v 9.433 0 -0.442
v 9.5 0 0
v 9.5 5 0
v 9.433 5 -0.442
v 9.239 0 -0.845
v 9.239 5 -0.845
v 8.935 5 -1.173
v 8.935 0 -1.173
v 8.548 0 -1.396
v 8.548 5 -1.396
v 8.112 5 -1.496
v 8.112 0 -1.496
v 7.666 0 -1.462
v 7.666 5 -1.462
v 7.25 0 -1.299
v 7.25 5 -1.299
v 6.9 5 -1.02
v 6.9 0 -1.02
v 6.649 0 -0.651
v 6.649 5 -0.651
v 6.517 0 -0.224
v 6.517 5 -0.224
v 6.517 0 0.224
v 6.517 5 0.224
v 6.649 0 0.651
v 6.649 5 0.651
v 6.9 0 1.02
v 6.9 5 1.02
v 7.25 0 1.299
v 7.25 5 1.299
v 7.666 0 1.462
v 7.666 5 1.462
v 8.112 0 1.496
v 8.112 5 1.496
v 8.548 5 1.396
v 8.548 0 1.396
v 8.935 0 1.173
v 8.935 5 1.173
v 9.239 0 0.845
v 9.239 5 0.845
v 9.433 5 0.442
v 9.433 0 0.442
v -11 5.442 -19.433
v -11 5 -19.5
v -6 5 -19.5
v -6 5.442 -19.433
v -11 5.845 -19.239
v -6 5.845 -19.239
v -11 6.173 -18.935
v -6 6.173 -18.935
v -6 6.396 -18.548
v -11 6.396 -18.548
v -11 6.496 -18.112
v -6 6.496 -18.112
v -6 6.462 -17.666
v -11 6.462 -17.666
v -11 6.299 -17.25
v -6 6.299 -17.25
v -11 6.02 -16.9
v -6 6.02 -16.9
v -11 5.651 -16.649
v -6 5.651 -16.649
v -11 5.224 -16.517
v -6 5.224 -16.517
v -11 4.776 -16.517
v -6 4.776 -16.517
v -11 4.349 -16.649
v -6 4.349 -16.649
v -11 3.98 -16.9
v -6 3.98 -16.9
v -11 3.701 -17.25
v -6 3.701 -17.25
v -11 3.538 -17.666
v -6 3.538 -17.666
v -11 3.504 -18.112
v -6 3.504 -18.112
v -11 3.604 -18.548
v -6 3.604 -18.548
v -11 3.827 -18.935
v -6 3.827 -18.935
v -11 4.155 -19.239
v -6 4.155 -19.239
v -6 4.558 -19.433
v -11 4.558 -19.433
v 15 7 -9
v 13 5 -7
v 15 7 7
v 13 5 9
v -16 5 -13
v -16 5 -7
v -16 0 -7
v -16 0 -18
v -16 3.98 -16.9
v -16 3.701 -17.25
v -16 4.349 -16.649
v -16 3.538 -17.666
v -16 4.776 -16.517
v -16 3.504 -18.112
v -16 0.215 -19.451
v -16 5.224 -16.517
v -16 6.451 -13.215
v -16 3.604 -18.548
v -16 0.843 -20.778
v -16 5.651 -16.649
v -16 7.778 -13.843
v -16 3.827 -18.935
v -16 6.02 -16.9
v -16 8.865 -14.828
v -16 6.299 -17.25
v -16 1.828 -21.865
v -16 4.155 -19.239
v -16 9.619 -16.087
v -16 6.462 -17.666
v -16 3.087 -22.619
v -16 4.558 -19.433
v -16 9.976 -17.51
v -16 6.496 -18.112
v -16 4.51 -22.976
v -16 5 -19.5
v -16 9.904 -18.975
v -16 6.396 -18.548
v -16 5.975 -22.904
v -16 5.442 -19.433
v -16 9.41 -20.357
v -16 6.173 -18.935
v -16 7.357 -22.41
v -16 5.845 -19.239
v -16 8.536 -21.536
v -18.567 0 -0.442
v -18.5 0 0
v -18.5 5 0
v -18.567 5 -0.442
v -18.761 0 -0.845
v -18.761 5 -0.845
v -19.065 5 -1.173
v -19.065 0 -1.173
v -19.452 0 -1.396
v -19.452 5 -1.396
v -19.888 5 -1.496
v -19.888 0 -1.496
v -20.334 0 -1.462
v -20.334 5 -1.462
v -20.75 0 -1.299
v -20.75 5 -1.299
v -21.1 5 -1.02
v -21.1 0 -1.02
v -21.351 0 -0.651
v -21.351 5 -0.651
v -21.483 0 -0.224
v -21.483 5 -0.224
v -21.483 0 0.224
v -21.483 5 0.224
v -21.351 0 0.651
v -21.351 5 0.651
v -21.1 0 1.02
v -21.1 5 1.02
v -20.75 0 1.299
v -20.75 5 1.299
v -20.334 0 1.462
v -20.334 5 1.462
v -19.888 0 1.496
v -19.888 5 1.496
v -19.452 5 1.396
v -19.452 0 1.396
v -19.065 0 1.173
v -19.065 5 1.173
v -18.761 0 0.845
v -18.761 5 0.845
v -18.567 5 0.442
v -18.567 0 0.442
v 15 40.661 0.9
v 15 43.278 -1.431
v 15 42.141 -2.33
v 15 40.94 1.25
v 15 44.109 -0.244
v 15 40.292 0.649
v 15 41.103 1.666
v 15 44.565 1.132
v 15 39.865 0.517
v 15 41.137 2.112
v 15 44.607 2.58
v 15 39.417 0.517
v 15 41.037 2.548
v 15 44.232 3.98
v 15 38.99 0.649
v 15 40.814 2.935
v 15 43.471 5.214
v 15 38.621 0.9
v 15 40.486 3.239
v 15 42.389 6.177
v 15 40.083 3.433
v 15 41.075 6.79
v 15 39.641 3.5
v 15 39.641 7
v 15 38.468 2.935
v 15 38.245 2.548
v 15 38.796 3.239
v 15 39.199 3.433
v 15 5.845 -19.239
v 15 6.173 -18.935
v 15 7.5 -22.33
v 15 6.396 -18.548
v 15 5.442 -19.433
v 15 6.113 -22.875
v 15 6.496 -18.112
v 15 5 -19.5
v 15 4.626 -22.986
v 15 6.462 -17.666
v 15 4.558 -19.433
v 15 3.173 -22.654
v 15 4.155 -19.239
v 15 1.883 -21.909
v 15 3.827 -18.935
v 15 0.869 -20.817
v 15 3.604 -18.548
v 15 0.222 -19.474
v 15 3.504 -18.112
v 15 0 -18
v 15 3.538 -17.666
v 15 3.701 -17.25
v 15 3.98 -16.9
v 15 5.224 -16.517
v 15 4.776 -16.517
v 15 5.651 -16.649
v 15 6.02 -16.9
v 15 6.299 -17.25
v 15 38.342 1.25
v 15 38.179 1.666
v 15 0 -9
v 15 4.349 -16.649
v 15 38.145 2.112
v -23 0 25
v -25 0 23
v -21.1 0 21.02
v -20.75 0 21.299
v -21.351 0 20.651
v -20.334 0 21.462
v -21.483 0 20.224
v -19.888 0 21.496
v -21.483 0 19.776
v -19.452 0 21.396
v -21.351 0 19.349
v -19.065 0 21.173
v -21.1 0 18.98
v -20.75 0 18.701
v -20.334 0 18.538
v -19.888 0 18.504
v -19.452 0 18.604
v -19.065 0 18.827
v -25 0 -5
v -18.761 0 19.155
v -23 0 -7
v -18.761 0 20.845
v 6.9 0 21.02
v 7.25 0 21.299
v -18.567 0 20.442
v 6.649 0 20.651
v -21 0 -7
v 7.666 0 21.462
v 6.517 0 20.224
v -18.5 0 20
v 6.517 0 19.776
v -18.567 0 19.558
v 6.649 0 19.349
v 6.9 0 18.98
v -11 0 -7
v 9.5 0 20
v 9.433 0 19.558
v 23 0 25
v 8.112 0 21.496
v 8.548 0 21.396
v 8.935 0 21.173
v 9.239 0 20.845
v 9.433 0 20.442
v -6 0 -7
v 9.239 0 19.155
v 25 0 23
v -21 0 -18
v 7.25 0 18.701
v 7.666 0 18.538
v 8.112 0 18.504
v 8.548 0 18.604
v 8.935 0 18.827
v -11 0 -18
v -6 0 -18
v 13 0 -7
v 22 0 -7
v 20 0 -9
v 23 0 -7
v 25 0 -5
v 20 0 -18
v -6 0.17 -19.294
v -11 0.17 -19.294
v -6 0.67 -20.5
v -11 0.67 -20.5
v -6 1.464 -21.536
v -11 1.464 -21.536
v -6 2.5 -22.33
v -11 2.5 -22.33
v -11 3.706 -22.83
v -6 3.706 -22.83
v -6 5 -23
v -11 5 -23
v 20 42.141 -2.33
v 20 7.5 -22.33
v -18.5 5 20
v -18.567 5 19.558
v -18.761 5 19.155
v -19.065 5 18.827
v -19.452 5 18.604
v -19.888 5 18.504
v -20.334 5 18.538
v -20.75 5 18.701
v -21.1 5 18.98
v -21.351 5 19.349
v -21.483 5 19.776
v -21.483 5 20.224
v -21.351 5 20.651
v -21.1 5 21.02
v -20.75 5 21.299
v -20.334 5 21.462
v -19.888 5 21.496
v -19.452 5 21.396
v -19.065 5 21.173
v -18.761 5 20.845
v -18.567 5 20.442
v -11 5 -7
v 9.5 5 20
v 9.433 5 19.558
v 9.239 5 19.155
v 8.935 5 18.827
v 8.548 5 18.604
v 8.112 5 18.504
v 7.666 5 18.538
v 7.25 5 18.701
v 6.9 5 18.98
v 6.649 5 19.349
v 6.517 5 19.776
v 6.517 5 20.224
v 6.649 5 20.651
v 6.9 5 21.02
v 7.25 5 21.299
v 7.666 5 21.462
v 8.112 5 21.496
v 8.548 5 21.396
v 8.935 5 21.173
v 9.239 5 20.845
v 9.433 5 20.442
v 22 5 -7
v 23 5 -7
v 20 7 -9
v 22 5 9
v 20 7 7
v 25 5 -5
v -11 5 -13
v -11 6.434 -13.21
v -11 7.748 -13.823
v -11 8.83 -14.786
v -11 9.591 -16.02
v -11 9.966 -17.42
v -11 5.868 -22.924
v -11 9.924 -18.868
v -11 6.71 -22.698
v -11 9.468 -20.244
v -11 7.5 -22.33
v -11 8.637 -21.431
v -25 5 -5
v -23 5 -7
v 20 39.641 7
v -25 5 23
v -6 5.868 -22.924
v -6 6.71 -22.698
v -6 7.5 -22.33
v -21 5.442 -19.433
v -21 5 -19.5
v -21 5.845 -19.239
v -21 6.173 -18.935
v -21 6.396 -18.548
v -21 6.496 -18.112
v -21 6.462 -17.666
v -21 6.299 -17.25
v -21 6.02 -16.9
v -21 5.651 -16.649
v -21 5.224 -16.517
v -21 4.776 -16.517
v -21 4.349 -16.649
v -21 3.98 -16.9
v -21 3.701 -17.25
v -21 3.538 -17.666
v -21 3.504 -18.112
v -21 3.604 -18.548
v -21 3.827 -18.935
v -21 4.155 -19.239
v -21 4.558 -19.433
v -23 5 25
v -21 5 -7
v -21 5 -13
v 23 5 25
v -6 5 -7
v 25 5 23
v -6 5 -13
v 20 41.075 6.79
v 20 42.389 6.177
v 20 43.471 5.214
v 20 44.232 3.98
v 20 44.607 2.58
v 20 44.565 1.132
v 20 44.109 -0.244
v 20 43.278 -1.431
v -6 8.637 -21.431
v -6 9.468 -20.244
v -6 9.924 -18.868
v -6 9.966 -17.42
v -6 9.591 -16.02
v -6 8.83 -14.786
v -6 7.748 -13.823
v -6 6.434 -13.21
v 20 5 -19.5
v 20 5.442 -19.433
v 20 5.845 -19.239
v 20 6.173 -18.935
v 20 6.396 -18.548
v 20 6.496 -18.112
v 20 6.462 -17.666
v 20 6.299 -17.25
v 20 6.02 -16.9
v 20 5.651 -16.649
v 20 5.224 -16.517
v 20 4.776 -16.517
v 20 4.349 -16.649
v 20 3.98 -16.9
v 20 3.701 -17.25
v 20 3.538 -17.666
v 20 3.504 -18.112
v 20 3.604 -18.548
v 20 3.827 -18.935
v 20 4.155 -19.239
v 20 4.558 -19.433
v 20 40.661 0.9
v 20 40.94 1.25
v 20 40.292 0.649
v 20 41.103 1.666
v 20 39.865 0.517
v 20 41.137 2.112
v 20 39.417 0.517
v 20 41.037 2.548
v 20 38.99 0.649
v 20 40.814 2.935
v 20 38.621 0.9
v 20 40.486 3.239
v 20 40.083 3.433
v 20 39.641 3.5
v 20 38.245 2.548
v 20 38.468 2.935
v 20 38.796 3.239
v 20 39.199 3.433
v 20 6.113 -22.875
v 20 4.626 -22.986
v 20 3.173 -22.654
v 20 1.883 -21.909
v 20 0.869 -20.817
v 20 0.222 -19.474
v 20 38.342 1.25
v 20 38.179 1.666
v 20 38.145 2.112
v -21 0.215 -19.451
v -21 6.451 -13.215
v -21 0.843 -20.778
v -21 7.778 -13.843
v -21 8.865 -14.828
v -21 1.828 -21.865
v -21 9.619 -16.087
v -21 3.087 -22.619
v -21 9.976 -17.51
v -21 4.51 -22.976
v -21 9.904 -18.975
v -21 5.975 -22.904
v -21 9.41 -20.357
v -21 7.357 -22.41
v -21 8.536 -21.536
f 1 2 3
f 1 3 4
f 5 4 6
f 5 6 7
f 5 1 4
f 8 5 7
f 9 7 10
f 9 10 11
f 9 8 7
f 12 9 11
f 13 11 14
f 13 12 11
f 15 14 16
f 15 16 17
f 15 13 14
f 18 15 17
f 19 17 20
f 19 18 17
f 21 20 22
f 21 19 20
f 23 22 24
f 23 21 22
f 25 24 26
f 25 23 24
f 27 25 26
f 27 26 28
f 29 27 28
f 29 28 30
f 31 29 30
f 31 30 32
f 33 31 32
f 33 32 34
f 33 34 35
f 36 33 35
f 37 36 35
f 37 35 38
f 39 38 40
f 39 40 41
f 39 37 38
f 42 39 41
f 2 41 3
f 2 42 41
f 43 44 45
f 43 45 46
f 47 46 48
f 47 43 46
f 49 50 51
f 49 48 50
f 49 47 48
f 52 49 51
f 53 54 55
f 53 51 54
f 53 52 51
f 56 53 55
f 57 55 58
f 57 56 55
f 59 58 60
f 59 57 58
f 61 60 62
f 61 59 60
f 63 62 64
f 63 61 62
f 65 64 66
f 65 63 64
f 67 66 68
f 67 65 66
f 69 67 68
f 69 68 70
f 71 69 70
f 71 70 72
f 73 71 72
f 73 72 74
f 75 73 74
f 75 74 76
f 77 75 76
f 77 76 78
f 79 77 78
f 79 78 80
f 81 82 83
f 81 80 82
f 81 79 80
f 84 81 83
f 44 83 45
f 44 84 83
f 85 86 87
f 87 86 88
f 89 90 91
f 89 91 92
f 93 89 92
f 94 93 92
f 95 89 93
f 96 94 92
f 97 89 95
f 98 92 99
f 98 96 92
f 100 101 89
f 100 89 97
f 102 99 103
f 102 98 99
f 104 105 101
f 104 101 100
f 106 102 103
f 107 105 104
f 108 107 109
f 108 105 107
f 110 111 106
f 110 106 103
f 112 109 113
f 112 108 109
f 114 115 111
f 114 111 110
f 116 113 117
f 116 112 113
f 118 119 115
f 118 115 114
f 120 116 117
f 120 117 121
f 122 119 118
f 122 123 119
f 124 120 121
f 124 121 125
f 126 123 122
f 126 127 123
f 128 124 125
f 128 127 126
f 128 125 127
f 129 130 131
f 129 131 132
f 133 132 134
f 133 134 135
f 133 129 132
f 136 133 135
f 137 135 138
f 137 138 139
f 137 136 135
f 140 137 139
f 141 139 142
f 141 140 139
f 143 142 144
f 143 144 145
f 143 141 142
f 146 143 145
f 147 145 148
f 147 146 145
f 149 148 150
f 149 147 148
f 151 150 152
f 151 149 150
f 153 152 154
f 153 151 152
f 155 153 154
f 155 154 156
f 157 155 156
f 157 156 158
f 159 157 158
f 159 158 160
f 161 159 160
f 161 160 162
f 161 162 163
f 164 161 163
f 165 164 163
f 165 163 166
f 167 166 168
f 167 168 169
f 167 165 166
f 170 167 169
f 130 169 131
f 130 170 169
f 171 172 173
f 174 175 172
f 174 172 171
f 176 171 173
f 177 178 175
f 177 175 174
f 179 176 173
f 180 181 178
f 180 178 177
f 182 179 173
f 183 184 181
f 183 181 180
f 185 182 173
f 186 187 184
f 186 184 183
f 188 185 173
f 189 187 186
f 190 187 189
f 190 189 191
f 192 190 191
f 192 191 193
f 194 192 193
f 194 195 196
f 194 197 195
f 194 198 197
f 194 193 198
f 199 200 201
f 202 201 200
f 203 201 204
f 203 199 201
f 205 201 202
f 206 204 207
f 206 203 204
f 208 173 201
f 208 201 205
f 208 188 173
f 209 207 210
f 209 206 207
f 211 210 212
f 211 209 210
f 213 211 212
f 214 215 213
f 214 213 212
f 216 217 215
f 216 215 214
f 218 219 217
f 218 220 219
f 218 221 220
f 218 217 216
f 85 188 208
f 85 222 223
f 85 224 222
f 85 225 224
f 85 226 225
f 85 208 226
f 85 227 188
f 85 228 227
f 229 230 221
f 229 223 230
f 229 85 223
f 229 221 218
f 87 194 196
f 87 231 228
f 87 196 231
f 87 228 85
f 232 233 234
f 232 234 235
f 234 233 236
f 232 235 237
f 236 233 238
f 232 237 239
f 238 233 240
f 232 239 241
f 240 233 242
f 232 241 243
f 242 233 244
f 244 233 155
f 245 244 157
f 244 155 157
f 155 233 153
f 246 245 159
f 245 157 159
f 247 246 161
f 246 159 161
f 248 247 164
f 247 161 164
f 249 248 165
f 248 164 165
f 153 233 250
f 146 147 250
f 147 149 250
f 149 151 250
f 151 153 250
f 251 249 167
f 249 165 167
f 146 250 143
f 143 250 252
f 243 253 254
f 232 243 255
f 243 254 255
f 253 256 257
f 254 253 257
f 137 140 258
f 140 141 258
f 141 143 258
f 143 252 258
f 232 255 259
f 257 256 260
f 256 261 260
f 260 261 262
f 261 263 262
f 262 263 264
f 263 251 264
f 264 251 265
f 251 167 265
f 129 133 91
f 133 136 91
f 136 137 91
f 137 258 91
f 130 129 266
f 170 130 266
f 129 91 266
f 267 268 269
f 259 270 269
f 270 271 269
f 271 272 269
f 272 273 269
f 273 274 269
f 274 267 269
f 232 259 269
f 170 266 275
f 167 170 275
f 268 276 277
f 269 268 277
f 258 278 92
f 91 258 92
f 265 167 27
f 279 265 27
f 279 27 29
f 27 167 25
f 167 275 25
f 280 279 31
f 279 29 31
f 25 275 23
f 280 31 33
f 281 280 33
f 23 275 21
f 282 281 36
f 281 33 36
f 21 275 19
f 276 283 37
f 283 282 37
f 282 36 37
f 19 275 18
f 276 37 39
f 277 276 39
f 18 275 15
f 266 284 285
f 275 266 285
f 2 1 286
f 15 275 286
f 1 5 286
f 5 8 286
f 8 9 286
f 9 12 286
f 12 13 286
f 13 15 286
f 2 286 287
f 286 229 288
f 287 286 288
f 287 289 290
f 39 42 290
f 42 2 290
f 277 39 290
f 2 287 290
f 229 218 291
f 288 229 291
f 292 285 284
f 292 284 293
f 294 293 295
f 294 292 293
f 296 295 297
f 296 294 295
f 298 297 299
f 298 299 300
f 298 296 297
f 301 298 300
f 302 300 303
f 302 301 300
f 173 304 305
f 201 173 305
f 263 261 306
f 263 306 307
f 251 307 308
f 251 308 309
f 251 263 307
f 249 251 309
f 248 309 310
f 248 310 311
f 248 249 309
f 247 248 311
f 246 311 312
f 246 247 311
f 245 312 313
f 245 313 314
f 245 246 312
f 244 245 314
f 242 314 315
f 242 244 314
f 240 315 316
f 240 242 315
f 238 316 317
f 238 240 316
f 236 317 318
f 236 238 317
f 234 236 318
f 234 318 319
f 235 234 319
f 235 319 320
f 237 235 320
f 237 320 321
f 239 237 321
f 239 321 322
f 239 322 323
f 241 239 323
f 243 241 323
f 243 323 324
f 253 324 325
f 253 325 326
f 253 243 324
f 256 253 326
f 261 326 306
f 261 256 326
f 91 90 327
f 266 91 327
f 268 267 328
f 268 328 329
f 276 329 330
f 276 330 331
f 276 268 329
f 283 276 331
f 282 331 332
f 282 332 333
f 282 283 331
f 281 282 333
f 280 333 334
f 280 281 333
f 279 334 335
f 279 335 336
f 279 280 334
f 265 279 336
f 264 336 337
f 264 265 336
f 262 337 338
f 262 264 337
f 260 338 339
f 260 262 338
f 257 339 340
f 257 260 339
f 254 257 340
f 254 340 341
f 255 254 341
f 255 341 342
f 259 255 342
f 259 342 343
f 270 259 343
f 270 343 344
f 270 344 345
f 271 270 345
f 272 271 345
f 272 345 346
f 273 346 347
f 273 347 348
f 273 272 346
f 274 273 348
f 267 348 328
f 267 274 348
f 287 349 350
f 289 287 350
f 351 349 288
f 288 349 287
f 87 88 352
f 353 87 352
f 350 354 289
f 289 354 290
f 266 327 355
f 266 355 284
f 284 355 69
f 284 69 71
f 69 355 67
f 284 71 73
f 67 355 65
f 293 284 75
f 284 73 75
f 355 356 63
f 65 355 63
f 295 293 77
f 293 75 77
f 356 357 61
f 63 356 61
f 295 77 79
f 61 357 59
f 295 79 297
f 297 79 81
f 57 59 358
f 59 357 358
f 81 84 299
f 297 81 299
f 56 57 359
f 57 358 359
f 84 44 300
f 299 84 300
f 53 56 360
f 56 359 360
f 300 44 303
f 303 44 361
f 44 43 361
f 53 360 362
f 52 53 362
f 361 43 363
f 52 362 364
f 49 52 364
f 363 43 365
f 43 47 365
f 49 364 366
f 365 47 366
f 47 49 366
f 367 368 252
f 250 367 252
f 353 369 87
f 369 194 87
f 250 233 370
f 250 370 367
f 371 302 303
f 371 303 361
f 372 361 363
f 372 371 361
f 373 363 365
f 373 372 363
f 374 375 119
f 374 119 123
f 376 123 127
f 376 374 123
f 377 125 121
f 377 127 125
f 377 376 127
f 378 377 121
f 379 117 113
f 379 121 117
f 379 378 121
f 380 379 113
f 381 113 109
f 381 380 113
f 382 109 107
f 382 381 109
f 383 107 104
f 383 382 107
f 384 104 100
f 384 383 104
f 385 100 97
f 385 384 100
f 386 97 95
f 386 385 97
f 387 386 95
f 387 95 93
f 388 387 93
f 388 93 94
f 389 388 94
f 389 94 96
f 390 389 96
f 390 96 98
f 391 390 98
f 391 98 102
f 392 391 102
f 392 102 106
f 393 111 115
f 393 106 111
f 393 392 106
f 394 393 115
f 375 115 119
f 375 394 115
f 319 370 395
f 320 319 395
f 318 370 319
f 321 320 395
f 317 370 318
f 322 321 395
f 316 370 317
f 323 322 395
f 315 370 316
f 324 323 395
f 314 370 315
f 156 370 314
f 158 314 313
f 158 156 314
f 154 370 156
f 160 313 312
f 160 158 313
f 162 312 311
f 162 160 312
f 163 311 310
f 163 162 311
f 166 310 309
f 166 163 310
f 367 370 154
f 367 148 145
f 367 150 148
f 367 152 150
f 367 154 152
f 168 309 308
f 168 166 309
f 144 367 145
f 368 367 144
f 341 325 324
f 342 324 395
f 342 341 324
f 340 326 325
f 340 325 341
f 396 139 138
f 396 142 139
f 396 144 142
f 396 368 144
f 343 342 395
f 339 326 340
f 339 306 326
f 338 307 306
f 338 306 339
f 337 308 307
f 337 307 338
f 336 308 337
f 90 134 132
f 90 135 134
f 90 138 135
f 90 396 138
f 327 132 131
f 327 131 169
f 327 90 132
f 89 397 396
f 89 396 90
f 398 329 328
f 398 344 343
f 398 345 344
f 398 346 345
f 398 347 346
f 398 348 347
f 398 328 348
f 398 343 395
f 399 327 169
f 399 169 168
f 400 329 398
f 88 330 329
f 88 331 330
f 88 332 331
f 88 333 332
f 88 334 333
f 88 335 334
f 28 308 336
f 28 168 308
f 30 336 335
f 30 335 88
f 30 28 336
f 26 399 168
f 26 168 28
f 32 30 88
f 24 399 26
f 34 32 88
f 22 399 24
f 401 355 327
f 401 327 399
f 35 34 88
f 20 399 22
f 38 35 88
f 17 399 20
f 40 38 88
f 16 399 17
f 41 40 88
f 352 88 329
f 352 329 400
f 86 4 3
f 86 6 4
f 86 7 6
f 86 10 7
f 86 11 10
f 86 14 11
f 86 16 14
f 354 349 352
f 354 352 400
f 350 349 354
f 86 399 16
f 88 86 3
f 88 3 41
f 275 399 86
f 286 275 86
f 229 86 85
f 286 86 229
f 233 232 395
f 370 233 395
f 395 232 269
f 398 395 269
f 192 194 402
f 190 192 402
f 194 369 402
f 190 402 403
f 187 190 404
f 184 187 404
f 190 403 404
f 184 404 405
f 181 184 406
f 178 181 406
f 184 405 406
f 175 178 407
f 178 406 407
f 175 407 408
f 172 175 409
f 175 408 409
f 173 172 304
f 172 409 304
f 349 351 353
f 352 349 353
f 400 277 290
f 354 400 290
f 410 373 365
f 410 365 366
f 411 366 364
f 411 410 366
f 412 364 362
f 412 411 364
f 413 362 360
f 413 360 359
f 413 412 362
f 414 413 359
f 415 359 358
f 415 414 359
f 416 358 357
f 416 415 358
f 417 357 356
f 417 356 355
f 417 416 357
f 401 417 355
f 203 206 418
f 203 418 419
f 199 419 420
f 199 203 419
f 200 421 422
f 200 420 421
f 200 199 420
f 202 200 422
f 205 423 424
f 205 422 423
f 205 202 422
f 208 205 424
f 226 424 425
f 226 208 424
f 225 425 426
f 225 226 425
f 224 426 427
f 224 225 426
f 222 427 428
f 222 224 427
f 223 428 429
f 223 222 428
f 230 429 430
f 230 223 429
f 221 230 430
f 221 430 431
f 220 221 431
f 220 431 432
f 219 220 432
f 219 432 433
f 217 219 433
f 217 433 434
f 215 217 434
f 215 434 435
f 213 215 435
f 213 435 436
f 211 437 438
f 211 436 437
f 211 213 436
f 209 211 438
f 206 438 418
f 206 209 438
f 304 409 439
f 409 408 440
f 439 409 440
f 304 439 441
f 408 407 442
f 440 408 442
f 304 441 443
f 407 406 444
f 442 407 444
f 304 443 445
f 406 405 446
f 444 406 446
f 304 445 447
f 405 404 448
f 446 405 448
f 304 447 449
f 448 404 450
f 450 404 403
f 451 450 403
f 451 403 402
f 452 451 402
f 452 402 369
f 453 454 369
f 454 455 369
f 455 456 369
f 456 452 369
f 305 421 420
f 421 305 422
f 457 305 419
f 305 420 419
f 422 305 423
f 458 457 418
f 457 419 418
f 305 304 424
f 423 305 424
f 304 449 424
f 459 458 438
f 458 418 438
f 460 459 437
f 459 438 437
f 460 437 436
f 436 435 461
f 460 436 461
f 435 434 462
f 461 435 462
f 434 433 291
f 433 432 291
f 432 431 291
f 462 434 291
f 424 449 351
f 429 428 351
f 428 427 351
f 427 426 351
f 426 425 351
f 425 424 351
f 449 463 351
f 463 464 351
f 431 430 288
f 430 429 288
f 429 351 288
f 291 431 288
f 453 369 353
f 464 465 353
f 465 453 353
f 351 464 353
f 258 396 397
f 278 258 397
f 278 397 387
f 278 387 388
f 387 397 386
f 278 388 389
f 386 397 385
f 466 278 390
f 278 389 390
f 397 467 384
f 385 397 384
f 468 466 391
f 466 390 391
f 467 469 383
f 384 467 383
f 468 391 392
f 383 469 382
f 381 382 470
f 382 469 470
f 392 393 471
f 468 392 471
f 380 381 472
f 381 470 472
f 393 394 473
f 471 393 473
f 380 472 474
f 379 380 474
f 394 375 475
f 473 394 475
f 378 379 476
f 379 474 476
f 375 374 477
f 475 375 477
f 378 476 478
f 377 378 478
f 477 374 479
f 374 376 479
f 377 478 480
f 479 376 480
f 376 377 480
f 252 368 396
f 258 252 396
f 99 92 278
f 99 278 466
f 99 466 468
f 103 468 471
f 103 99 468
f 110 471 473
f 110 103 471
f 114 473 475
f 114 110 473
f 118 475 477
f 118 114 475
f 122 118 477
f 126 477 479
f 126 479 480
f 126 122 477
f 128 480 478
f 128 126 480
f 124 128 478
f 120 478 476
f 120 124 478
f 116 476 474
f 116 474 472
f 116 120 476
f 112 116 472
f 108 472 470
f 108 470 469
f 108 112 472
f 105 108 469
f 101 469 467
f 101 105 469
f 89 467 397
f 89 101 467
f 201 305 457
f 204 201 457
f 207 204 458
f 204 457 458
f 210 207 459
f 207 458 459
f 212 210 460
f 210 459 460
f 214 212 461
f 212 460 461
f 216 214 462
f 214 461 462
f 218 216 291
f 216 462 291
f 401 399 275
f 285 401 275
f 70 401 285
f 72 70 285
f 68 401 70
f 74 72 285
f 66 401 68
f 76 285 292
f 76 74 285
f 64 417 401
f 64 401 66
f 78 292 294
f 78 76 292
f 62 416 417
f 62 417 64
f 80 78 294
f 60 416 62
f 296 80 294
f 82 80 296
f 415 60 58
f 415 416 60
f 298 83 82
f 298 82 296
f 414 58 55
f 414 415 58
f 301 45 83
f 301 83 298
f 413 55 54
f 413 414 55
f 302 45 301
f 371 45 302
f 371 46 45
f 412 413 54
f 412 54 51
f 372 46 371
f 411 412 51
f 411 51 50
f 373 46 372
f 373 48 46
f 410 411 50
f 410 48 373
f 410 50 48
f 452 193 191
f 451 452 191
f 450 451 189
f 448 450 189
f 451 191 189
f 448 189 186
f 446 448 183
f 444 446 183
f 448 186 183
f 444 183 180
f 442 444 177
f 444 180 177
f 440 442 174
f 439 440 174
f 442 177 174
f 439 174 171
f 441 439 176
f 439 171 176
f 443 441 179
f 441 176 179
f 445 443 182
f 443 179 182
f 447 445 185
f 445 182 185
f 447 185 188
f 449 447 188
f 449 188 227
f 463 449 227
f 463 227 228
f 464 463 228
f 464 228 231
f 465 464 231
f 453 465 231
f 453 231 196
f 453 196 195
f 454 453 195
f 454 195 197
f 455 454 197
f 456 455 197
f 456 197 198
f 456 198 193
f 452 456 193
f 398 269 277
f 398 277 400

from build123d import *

# Parameters (mm, degrees)
SKETCH_1_W                 = 50
SKETCH_1_H                 = 43
EXTRUDE_1_DEPTH            = 5
EXTRUDE_2_DEPTH            = 5
EXTRUDE_START              = -6
EXTRUDE_3_DEPTH            = 5
EXTRUDE_START_2            = 5
SKETCH_6_R                 = 5
EXTRUDE_4_DEPTH            = 5
SKETCH_7_W                 = 5
SKETCH_7_H                 = 11
SKETCH_7_W_2               = 21
SKETCH_7_W_3               = 4
CUT_EXTRUDE_1_DEPTH        = 54.116947969
CUT_EXTRUDE_2_DEPTH        = 69.138244203
CUT_EXTRUDE_2_DEPTH_BACK   = 69.138244203
SKETCH_9_R                 = 1.5
CHAMFER_1_SIZE             = 2
SKETCH_10_R                = 1.5
CUT_EXTRUDE_3_DEPTH        = 65.944748233
RIB_1_REACH                = 70.138
SKETCH_11_WALL_W           = 172.917504556
SKETCH_11_WALL_H           = 5
CHAMFER_2_SIZE             = 2
HOLE_WIZARD_M3_1_OUTLINE_R = 1.5
HOLE_WIZARD_M3_1_DEPTH     = 5


# Read off the part's stored shape, not the designer's step: M3 螺纹孔1
with BuildPart() as part:
    # 草图1 → 凸台-拉伸1 (new body)
    with BuildSketch(Plane(origin=(0, 0, 0), x_dir=(1, 0, 0), z_dir=(0, 1, 0))):
        with Locations((0, -3.5)):
            Rectangle(SKETCH_1_W, SKETCH_1_H)
    extrude(amount=EXTRUDE_1_DEPTH)

    # 草图3 → 凸台-拉伸2 (add)
    with BuildSketch(Plane(origin=(20, 0, 0), x_dir=(0, 0, -1), z_dir=(1, 0, 0))):
        with BuildLine():
            Line((13.669872981, 2.5), (-6.330127019, 37.141016151))
            ThreePointArc((-6.330127019, 37.141016151), (-4.5, 43.97114317), (2.330127019, 42.141016151))
            Line((2.330127019, 42.141016151), (22.330127019, 7.5))
            ThreePointArc((22.330127019, 7.5), (20.5, 0.669872981), (13.669872981, 2.5))
        make_face()
    extrude(amount=-EXTRUDE_2_DEPTH)

    # 草图5 → 凸台-拉伸3 (add)
    with BuildSketch(Plane(origin=(0, 0, 0), x_dir=(0, 0, -1), z_dir=(1, 0, 0)).offset(EXTRUDE_START)):
        with BuildLine():
            ThreePointArc((22.330127019, 7.5), (13.669872981, 7.5), (18, 0))
            ThreePointArc((18, 0), (21.535533906, 1.464466094), (23, 5))
            ThreePointArc((23, 5), (22.829629131, 6.294095226), (22.330127019, 7.5))
        make_face()
    extrude(amount=-EXTRUDE_3_DEPTH)

    # 草图6 → 凸台-拉伸4 (add)
    with BuildSketch(Plane(origin=(-21, 0, 0), x_dir=(0, 0, -1), z_dir=(1, 0, 0)).offset(EXTRUDE_START_2)):
        with Locations((18, 5)):
            Circle(SKETCH_6_R)
    extrude(amount=-EXTRUDE_4_DEPTH)

    # 草图7 → 切除-拉伸1 (cut, through all)
    with BuildSketch(Plane(origin=(0, 5, 0), x_dir=(1, 0, 0), z_dir=(0, 1, 0))):
        with Locations((-13.5, 12.5)):
            Rectangle(SKETCH_7_W, SKETCH_7_H)
        with Locations((4.5, 12.5)):
            Rectangle(SKETCH_7_W_2, SKETCH_7_H)
        with Locations((22.5, 12.5)):
            Rectangle(SKETCH_7_W, SKETCH_7_H)
        with Locations((-23, 12.5)):
            Rectangle(SKETCH_7_W_3, SKETCH_7_H)
    extrude(amount=-CUT_EXTRUDE_1_DEPTH, mode=Mode.SUBTRACT)

    # 草图9 → 切除-拉伸2 (cut, two sides: drawn at the far end of the back side and taken through both)
    with BuildSketch(Plane(origin=(20, 0, 0), x_dir=(0, 0, -1), z_dir=(1, 0, 0)).offset(-CUT_EXTRUDE_2_DEPTH_BACK)):
        with Locations((18, 5)):
            Circle(SKETCH_9_R)
    extrude(amount=CUT_EXTRUDE_2_DEPTH + CUT_EXTRUDE_2_DEPTH_BACK, mode=Mode.SUBTRACT)

    # 倒角1
    chamfer_1_edges = [part.edges().sort_by_distance(p)[0] for p in [
        (-25, 2.5, -7),
        (25, 2.5, 25),
        (25, 2.5, -7),
        (-25, 2.5, 25),
    ]]
    chamfer(chamfer_1_edges, length=CHAMFER_1_SIZE)

    # 草图10 → 切除-拉伸3 (cut, through all)
    with BuildSketch(Plane.ZY.offset(-15)):
        with Locations((2, 39.641016151)):
            Circle(SKETCH_10_R)
    extrude(amount=-CUT_EXTRUDE_3_DEPTH, mode=Mode.SUBTRACT)

    # 草图11 wall → 筋1 (add, up to next)
    with BuildSketch(Plane(origin=(20, 22.320508076, 7), x_dir=(0, -1, 0), z_dir=(0, 0, -1)), mode=Mode.PRIVATE) as rib_1_sk1:
        with Locations((0, 2.5)):
            Rectangle(SKETCH_11_WALL_W, SKETCH_11_WALL_H)
    rib_1_tool1 = extrude(rib_1_sk1.sketch, amount=RIB_1_REACH, mode=Mode.PRIVATE) - part.part
    add(rib_1_tool1.solids().sort_by_distance((20, 22.320508076, 7))[0])

    # 倒角2
    chamfer_2_edges = [part.edges().sort_by_distance(p)[0] for p in [
        (15, 5, 0),
        (17.5, 5, 7),
        (20, 5, 0),
        (20, 2.5, -7),
        (15, 2.5, -7),
    ]]
    chamfer(chamfer_2_edges, length=CHAMFER_2_SIZE)

    # M3 螺纹孔1 outline → M3 螺纹孔1 (cut)
    with BuildSketch(Plane(origin=(0, 0, 0), x_dir=(1, 0, 0), z_dir=(0, 1, 0))):
        with Locations((8, 0)):
            Circle(HOLE_WIZARD_M3_1_OUTLINE_R)
        with Locations((-20, -20)):
            Circle(HOLE_WIZARD_M3_1_OUTLINE_R)
        with Locations((-20, 0)):
            Circle(HOLE_WIZARD_M3_1_OUTLINE_R)
        with Locations((8, -20)):
            Circle(HOLE_WIZARD_M3_1_OUTLINE_R)
    extrude(amount=HOLE_WIZARD_M3_1_DEPTH, mode=Mode.SUBTRACT)


solid = part.part
